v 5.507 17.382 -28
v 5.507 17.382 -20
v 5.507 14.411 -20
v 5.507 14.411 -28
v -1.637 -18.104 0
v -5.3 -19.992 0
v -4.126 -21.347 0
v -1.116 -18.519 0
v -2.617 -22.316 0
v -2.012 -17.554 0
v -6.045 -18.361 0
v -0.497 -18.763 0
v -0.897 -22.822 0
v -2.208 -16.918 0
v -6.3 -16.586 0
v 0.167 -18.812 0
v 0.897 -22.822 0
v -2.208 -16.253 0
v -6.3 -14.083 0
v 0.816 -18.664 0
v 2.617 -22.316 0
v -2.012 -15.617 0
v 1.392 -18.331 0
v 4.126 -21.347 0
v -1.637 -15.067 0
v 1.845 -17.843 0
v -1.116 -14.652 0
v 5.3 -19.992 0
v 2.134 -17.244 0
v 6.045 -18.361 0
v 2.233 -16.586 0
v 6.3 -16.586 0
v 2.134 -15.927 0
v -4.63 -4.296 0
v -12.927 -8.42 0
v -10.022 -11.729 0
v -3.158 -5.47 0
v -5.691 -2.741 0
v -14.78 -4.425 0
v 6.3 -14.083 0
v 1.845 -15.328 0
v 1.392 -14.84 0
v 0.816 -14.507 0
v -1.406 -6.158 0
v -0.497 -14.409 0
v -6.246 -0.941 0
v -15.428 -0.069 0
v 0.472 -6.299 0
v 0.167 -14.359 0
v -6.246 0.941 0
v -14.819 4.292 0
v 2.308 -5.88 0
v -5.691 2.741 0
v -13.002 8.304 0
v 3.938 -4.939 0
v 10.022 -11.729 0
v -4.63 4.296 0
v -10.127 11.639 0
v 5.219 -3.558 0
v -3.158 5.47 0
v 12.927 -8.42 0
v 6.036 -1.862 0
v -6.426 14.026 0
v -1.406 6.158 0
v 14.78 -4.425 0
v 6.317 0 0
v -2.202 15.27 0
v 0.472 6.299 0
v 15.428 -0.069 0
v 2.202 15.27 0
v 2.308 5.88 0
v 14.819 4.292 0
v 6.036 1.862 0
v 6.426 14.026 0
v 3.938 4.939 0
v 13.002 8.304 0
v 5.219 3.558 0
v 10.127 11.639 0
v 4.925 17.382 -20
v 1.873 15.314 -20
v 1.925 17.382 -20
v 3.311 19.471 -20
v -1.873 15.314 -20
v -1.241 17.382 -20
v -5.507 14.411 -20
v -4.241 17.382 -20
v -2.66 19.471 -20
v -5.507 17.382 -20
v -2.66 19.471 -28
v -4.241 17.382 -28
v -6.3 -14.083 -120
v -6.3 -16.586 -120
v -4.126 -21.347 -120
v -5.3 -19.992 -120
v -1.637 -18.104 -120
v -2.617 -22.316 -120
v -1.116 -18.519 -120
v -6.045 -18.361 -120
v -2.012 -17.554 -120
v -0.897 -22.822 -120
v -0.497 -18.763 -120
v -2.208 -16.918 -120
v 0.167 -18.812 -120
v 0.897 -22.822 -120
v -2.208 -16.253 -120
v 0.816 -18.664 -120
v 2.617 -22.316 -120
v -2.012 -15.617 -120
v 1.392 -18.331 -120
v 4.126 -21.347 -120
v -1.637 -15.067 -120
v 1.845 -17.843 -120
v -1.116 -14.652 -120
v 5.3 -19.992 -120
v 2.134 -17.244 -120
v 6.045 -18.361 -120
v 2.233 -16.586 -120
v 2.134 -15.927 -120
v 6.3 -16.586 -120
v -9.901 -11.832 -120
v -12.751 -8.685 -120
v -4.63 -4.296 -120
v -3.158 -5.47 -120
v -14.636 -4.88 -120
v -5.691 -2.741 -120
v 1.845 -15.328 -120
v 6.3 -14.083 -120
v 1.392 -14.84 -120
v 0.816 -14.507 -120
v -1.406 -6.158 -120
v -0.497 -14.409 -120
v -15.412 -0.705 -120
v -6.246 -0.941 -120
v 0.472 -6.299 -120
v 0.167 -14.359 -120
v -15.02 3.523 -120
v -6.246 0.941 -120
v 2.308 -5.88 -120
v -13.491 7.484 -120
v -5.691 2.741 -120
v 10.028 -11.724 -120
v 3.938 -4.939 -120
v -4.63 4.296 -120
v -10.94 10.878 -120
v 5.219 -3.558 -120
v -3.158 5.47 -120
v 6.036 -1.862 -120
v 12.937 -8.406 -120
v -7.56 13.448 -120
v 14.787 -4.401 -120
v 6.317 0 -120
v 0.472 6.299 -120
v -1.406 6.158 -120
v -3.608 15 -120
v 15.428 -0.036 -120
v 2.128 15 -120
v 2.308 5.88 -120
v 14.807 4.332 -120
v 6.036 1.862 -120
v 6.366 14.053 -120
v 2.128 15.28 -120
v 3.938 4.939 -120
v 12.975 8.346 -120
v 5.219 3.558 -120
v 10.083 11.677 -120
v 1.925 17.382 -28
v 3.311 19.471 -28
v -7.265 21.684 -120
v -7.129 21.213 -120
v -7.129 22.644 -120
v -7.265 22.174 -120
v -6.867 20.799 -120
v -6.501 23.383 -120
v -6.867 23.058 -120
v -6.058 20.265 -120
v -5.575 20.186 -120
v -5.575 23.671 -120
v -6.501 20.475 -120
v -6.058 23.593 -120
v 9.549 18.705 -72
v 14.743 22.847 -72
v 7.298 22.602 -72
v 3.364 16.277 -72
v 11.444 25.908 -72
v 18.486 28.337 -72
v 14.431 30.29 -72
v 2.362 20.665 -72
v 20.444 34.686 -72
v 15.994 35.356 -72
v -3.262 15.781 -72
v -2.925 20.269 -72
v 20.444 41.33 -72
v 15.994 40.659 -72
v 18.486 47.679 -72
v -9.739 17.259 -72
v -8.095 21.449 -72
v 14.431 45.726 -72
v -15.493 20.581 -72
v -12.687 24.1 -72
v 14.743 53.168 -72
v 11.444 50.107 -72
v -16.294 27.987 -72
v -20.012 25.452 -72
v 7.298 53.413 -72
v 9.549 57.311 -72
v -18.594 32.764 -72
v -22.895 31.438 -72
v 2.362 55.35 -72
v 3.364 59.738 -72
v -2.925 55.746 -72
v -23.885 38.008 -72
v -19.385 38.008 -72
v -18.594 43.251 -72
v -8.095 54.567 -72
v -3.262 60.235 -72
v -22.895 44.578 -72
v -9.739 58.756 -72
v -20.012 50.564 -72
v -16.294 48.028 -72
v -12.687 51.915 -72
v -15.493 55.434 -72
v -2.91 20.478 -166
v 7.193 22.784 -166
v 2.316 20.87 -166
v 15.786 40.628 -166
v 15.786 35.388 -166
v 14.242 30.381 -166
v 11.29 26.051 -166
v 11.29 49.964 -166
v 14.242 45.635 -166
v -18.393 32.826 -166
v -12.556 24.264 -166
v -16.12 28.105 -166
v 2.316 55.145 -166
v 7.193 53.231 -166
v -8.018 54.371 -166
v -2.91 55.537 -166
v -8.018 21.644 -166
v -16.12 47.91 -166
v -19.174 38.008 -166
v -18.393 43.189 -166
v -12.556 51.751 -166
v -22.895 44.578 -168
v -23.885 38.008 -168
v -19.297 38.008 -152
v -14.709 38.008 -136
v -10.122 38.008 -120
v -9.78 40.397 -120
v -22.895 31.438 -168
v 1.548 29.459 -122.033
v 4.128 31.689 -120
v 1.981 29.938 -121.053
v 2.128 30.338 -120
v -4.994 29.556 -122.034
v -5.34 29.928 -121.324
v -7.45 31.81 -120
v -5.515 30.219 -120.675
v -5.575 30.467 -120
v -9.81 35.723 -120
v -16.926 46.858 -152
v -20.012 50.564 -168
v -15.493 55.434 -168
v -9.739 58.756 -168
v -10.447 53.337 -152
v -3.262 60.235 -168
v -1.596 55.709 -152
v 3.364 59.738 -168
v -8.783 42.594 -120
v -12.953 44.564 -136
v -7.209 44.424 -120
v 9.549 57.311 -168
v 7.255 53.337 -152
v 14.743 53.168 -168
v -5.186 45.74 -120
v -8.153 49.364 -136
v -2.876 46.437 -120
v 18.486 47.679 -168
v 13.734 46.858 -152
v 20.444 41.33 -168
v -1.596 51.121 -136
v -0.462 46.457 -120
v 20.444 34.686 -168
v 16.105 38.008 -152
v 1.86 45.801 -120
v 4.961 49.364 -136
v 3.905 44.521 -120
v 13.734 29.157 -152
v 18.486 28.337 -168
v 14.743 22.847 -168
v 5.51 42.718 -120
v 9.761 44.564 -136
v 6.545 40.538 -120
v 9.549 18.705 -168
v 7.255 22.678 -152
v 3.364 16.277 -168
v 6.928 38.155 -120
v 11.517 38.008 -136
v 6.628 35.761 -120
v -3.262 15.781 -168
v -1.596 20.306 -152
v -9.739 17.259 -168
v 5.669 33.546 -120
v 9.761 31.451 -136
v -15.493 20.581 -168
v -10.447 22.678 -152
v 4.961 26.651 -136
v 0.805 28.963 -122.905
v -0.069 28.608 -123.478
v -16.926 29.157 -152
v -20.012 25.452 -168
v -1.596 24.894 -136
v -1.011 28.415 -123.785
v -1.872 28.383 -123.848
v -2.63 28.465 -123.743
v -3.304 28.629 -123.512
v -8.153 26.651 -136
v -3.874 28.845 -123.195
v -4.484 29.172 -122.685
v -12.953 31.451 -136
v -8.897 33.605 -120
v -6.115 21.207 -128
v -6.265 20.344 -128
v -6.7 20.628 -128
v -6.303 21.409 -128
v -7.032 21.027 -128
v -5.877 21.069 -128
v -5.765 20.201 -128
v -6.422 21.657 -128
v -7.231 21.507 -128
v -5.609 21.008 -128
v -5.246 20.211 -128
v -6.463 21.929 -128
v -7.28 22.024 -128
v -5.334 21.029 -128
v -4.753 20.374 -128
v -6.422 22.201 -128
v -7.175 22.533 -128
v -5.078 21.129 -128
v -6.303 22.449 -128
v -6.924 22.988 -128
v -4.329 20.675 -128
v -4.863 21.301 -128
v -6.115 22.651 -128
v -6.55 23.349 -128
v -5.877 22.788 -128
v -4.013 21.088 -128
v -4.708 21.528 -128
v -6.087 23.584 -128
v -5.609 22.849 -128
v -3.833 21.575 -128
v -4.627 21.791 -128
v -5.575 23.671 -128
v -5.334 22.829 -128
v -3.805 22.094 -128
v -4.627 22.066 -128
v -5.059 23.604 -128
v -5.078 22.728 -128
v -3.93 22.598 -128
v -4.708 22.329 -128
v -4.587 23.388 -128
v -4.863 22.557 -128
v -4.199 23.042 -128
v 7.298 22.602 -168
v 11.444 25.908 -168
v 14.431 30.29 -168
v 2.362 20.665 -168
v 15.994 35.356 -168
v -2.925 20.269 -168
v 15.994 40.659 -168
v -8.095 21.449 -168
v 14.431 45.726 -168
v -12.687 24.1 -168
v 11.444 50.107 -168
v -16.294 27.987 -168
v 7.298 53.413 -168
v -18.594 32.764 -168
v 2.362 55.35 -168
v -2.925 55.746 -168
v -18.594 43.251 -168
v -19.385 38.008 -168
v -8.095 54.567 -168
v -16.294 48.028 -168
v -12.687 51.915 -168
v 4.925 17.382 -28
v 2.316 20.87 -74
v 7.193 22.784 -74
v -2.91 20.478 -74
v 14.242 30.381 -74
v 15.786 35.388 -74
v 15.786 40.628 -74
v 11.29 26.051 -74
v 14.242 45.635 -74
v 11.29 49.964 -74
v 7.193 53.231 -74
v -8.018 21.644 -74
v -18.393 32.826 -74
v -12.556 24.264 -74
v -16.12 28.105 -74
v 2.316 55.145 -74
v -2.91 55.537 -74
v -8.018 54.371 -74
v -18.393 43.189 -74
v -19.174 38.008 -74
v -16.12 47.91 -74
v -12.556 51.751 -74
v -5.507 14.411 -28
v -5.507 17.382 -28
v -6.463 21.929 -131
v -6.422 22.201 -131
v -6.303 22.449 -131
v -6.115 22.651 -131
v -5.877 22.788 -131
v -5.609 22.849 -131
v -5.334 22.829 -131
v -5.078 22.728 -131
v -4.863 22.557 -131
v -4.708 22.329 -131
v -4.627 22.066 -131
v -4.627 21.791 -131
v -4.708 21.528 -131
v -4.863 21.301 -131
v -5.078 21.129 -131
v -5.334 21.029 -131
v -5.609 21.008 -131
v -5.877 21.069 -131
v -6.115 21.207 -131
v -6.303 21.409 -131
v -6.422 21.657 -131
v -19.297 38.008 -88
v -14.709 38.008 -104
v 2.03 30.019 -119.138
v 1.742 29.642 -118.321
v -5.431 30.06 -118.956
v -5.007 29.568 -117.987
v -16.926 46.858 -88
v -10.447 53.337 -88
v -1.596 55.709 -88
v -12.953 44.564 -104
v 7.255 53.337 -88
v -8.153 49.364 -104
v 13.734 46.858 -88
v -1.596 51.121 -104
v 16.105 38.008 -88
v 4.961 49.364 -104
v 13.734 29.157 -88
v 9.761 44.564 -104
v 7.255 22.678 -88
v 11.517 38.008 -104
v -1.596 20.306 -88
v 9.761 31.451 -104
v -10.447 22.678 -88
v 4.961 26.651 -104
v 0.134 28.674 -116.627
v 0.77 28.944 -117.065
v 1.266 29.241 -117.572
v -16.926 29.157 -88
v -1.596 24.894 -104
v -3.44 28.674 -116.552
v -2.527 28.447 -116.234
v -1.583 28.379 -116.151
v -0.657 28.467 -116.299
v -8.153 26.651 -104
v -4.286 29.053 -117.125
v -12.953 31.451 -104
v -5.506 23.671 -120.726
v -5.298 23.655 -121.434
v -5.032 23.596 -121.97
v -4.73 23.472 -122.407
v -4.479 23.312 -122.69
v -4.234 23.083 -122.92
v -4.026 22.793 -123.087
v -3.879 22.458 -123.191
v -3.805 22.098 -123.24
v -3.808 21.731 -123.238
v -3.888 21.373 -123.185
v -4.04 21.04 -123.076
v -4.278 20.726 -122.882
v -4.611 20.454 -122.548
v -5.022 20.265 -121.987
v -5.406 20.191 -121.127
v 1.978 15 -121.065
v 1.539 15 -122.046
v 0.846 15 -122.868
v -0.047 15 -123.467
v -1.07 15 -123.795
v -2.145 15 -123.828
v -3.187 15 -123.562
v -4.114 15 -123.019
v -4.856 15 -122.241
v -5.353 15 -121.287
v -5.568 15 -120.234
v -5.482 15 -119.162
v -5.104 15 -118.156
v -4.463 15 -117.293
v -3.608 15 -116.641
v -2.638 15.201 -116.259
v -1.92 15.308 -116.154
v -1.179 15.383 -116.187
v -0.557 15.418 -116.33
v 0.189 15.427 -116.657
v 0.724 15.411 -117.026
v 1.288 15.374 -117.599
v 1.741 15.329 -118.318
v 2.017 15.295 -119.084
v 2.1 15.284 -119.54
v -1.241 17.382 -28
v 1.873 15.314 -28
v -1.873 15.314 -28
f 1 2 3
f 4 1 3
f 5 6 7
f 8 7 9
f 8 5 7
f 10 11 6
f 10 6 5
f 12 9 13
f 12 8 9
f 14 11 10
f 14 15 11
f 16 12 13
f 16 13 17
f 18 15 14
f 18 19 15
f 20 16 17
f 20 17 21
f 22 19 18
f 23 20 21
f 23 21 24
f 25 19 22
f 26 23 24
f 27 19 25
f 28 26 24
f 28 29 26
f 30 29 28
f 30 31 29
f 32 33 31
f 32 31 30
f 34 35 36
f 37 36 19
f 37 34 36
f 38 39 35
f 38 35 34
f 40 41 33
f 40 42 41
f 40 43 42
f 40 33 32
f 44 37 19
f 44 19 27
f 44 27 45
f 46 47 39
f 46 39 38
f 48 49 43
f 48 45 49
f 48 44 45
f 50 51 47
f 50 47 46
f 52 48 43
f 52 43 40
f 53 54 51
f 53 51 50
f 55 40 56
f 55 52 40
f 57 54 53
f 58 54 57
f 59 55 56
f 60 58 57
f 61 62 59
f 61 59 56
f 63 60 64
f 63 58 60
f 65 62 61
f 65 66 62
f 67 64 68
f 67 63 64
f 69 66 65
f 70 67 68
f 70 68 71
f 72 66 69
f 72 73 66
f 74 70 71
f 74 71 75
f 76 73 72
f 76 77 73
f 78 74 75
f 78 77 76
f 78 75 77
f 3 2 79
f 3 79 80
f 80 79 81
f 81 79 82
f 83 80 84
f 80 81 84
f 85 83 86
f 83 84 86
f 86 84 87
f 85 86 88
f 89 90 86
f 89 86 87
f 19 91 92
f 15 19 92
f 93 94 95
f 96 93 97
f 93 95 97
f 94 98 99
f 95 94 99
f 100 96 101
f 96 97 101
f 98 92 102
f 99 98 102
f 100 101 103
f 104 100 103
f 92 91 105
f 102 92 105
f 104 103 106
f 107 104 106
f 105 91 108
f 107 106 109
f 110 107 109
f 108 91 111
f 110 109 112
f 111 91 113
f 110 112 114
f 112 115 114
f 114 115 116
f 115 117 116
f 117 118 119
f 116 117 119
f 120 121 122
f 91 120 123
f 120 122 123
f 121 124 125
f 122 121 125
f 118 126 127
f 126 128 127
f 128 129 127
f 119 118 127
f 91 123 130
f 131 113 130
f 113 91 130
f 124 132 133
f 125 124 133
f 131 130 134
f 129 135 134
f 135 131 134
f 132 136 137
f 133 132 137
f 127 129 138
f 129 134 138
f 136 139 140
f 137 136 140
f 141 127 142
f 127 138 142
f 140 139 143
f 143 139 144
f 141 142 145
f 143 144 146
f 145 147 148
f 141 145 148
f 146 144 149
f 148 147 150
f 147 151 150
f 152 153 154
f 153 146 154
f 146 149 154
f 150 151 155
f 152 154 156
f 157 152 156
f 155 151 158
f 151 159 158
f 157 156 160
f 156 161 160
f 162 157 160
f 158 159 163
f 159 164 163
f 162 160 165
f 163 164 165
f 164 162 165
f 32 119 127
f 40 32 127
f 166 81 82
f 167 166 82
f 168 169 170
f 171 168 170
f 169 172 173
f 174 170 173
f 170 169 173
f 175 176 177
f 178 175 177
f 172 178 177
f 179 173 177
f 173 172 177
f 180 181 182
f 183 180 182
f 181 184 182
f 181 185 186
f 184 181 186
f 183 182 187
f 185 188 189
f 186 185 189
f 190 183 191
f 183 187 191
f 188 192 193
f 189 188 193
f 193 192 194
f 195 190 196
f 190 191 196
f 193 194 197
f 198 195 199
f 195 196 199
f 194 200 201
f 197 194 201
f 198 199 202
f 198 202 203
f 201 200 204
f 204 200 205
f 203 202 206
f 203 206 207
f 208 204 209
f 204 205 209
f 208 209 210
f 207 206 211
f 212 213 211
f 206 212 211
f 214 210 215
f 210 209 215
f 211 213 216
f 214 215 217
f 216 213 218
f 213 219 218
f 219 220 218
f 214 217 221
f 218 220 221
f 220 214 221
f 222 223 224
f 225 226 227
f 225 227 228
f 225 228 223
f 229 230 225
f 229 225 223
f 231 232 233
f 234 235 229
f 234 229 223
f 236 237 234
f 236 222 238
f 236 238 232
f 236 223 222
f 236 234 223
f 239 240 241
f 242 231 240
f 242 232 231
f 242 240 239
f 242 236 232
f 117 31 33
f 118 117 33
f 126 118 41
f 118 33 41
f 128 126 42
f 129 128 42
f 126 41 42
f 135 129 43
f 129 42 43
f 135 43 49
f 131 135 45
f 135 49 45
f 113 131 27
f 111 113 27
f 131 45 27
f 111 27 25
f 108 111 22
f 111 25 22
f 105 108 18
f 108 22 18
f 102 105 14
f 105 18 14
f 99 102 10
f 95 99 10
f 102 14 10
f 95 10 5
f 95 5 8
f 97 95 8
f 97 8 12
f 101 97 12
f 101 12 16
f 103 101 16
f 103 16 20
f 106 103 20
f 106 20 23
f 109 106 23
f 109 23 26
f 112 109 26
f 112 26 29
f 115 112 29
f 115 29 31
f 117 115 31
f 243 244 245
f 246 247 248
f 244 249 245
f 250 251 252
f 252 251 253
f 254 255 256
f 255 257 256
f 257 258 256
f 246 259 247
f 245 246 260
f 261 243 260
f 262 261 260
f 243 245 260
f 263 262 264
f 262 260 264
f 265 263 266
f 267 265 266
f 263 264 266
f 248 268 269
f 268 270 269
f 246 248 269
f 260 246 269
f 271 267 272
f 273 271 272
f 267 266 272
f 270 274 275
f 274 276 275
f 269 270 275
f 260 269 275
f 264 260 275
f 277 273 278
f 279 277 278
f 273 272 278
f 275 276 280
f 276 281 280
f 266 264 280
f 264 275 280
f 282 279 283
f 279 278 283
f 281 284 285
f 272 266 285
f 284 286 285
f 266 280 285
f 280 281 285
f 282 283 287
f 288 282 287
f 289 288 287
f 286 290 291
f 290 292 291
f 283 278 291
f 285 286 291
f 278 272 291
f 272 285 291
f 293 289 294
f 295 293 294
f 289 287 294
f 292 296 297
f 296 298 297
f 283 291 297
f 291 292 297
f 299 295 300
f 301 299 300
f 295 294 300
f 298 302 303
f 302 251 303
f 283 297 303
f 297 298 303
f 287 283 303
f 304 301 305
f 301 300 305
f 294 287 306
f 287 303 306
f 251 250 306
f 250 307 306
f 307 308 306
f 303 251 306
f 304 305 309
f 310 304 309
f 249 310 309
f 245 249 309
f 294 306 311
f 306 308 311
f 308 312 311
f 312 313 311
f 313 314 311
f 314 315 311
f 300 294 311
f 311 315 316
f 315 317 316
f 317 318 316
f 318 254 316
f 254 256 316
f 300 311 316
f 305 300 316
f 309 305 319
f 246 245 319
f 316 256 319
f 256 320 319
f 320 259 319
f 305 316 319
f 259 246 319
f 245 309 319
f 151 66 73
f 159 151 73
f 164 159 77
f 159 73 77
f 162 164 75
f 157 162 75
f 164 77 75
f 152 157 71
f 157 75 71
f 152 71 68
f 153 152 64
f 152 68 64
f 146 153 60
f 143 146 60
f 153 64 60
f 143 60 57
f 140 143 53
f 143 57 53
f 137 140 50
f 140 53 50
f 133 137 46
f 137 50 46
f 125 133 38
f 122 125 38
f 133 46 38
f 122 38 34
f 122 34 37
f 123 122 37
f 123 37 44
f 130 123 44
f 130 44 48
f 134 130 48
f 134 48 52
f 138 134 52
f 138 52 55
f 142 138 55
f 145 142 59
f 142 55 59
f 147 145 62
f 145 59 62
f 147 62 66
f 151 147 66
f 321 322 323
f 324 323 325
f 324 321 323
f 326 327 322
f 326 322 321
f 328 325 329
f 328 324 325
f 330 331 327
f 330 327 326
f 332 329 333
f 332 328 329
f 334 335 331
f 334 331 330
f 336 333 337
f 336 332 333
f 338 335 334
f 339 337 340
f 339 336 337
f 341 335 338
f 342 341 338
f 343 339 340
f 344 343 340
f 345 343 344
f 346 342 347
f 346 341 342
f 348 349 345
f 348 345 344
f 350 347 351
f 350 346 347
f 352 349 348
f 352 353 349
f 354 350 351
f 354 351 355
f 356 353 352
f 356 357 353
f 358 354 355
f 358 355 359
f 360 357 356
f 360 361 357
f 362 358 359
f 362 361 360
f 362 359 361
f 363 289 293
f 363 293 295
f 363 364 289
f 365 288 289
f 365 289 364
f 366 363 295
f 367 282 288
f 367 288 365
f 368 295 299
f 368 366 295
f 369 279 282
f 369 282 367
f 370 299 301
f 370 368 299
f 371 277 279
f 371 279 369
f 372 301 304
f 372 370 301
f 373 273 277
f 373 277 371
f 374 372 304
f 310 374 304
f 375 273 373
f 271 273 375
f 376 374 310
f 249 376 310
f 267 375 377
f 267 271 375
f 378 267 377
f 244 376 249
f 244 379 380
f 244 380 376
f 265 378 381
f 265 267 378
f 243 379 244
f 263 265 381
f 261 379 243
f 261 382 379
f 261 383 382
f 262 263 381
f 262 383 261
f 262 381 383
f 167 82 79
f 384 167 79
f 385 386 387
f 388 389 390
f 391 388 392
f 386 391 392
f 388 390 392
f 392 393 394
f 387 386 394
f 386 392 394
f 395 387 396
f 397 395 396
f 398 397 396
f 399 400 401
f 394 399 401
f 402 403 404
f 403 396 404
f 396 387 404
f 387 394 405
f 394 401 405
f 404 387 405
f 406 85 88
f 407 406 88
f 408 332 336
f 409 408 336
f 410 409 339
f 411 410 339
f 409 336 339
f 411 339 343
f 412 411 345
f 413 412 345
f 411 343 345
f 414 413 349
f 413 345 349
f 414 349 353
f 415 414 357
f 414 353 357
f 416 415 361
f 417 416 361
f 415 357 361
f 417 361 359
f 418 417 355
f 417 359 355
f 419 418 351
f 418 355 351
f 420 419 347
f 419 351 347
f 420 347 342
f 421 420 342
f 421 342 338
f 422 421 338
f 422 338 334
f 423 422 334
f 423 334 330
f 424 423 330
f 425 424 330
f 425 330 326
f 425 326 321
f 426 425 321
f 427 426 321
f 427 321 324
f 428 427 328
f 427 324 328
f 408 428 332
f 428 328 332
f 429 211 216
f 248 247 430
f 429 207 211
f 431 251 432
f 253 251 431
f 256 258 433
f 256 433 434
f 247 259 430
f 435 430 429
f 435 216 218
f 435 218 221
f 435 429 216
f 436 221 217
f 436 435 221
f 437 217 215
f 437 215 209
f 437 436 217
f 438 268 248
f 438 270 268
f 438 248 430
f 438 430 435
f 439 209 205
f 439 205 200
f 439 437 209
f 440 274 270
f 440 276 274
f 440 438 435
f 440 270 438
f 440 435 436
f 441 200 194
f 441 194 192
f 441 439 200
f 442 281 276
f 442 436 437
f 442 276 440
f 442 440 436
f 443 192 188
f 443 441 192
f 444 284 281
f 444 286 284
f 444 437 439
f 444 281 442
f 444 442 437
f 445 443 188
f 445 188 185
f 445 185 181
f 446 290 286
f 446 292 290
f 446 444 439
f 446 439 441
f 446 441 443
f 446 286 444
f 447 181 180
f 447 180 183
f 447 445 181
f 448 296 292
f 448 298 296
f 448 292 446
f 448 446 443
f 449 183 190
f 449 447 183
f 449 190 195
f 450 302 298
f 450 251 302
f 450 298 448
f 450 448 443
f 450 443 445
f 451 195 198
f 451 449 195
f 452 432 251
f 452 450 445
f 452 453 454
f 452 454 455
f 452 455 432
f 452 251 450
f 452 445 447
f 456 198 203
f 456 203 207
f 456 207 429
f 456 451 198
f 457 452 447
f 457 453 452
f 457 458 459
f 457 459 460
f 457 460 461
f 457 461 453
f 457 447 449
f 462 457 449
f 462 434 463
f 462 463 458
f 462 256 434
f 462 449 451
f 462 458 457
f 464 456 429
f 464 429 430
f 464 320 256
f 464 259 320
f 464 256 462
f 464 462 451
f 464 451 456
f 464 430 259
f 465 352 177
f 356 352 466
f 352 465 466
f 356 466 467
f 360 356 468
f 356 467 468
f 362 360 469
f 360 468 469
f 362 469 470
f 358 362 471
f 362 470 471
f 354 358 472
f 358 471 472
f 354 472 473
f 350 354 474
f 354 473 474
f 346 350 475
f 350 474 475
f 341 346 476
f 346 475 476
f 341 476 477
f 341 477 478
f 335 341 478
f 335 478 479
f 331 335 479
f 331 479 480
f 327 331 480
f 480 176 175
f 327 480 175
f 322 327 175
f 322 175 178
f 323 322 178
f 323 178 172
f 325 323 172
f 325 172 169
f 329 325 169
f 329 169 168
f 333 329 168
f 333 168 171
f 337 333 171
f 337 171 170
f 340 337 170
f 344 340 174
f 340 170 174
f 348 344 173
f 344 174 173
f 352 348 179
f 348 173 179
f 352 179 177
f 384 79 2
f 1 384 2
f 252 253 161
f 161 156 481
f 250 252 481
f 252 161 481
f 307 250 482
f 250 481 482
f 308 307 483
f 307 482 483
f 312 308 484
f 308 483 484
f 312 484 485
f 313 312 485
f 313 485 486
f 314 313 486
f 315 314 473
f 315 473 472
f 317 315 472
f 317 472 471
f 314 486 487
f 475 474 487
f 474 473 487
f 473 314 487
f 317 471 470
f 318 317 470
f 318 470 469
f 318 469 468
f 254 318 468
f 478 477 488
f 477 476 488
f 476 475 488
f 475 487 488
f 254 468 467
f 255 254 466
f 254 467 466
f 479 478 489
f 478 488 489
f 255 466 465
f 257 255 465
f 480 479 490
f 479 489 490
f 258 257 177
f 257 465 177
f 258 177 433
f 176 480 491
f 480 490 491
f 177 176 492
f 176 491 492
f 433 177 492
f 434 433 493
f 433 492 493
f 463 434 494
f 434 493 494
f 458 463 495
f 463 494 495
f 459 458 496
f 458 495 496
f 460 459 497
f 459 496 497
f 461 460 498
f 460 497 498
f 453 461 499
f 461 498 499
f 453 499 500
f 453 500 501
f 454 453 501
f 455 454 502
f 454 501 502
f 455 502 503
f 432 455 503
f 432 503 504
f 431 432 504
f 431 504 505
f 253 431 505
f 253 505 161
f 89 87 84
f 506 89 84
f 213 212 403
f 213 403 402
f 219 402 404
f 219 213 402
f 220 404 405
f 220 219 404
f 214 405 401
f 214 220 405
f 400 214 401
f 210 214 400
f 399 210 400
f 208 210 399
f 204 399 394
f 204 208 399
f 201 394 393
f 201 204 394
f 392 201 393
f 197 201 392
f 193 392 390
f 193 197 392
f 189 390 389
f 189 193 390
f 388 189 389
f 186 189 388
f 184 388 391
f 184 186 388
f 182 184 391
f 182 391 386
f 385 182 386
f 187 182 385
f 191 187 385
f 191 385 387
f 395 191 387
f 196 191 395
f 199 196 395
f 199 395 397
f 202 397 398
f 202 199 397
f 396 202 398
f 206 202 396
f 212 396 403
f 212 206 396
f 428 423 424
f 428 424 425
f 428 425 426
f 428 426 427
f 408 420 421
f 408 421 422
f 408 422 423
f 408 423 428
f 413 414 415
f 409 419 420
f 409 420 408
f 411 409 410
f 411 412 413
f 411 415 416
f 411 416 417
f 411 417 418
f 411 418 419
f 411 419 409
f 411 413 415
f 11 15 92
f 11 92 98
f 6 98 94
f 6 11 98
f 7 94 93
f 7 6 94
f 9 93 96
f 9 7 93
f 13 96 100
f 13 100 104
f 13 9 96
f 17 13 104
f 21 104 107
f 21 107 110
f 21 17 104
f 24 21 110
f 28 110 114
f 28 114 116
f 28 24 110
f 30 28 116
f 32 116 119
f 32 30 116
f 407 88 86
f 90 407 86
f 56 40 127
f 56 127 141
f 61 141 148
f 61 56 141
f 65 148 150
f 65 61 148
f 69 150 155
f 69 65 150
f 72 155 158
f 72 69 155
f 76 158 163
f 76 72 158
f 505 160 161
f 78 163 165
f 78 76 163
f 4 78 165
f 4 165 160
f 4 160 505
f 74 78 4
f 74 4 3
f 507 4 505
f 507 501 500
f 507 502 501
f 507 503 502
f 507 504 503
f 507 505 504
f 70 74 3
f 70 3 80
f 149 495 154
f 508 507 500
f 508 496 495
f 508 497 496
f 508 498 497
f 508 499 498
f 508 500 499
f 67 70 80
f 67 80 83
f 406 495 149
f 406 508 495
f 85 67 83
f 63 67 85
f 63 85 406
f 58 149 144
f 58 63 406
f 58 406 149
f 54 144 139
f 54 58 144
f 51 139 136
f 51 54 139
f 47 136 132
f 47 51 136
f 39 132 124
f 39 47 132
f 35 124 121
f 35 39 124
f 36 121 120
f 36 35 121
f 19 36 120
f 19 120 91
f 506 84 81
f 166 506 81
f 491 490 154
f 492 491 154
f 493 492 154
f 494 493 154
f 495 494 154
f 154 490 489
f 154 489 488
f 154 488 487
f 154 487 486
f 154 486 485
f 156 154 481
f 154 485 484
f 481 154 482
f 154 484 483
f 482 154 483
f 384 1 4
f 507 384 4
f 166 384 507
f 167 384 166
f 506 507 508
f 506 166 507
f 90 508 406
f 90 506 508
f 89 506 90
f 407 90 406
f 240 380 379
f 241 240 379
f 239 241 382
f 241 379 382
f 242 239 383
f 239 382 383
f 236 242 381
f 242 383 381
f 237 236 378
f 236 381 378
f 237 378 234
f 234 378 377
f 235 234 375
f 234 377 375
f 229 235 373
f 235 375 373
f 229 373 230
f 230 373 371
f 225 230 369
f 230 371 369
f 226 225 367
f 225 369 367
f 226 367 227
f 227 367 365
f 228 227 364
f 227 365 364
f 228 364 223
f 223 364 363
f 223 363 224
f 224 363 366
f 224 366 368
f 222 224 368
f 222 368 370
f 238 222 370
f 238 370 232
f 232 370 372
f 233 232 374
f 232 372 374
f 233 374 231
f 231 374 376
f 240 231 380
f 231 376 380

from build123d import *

# Parameters (mm, degrees)
SKETCH1_R           = 15.427757536
SKETCH1_R_2         = 6.316623128
BOSS_EXTRUDE1_DEPTH = 120
SKETCH2_R           = 2.232947937
CUT_EXTRUDE1_DEPTH  = 124.133145307
BOSS_EXTRUDE2_DEPTH = 8
SKETCH4_R           = 8.525514215
BOSS_EXTRUDE3_DEPTH = 48
BOSS_EXTRUDE3_DRAFT = -16
SKETCH6_R           = 17.788526435
CUT_EXTRUDE2_DEPTH  = 2
CUT_EXTRUDE2_DRAFT  = -6
SKETCH9_R           = 3.851191152
BOSS_EXTRUDE4_DEPTH = 17
SKETCH10_R          = 1.742885096
BOSS_EXTRUDE5_DEPTH = 8
SKETCH11_R          = 0.9231432
BOSS_EXTRUDE6_DEPTH = 3


with BuildPart() as part:
    # Sketch1 → Boss-Extrude1 (new body)
    # profile 1 of 2: a face of its own
    with BuildSketch(Plane.XY):
        with BuildLine():
            ThreePointArc((6.300172561, -14.082738665), (0, -15.427757536), (-6.300172561, -14.082738665))
            Line((-6.300172561, -14.082738665), (-6.300172561, -16.585538494))
            ThreePointArc((-6.300172561, -16.585538494), (0, -22.885711055), (6.300172561, -16.585538494))
            Line((6.300172561, -16.585538494), (6.300172561, -14.082738665))
        make_face()
    # profile 2 of 2: a face of its own
    with BuildSketch(Plane.XY):
        Circle(SKETCH1_R)
        Circle(SKETCH1_R_2, mode=Mode.SUBTRACT)
    extrude(amount=-BOSS_EXTRUDE1_DEPTH)

    # Sketch2 → Cut-Extrude1 (cut, through all)
    with BuildSketch(Plane.XY):
        with Locations((0, -16.585538494)):
            Circle(SKETCH2_R)
    extrude(amount=-CUT_EXTRUDE1_DEPTH, mode=Mode.SUBTRACT)

    # Sketch3 → Boss-Extrude2 (add)
    with BuildSketch(Plane.XY.offset(-20)):
        Polygon((-5.507367926, 14.411266465), (-5.507367926, 17.381711903), (-4.2414169, 17.381711903), (-2.659812694, 19.470864473), (-1.2414169, 17.381711903), (1.925005593, 17.381711903), (3.311155437, 19.470864473), (4.925005593, 17.381711903), (5.507367926, 17.381711903), (5.507367926, 14.411266465), align=None)
    extrude(amount=-BOSS_EXTRUDE2_DEPTH)



with BuildPart() as body_2:
    # Sketch4 → Boss-Extrude3 (with draft: the straight prism first)
    with BuildSketch(Plane(origin=(0, 0, -120), x_dir=(-1, 0, 0), z_dir=(0, 0, -1))):
        with Locations((1.595997464, 38.007665121)):
            Circle(SKETCH4_R)
    extrude(amount=BOSS_EXTRUDE3_DEPTH)
    # Boss-Extrude3: the draft: its side faces are tilted about the plane it starts from
    boss_extrude3_sides = [body_2.faces().sort_by_distance(p)[0] for p in [
        (6.929516751, 38.007665121, -144),
    ]]
    draft(boss_extrude3_sides, Plane(origin=(0, 0, -120), x_dir=(-1, 0, 0), z_dir=(0, 0, -1)), BOSS_EXTRUDE3_DRAFT)


with BuildPart() as cut_extrude2_tool:
    # Sketch6 → Cut-Extrude2 (with draft: the straight prism first)
    with BuildSketch(Plane(origin=(0, 0, -168), x_dir=(-1, 0, 0), z_dir=(0, 0, -1))):
        with Locations((1.595997464, 38.007665121)):
            Circle(SKETCH6_R)
    extrude(amount=-CUT_EXTRUDE2_DEPTH)
    # Cut-Extrude2: the draft: its side faces are tilted about the plane it starts from
    cut_extrude2_sides = [cut_extrude2_tool.faces().sort_by_distance(p)[0] for p in [
        (16.192528971, 38.007665121, -167),
    ]]
    draft(cut_extrude2_sides, Plane(origin=(0, 0, -168), x_dir=(-1, 0, 0), z_dir=(0, 0, -1)), CUT_EXTRUDE2_DRAFT)


with BuildPart() as body_2_1:
    add(body_2.part)

    # Cut-Extrude2: cut by cut_extrude2_tool
    add(cut_extrude2_tool.part, mode=Mode.SUBTRACT)


with BuildPart() as body_3:
    # Mirror2: mirrored copy
    add(body_2_1.part.mirror(Plane(origin=(-1.595997464, 38.007665121, -120), x_dir=(1, 0, 0), z_dir=(0, 0, -1))))


with BuildPart() as part_1:
    add(part.part)

    add(body_2_1.part)  # Boss-Extrude4 merges body 2

    add(body_3.part)  # Boss-Extrude4 merges body 3
    # Sketch9 → Boss-Extrude4 (add)
    with BuildSketch(Plane(origin=(0, 15, 0), x_dir=(1, 0, 0), z_dir=(0, 1, 0))):
        with Locations((-1.723427255, 120)):
            Circle(SKETCH9_R)
    extrude(amount=BOSS_EXTRUDE4_DEPTH)

    # Sketch10 → Boss-Extrude5 (add)
    with BuildSketch(Plane(origin=(0, 0, -120), x_dir=(-1, 0, 0), z_dir=(0, 0, -1))):
        with Locations(Location((5.539882161, 21.928787469, 0), (0, 0, 88.858001541))):
            Circle(SKETCH10_R)
    extrude(amount=BOSS_EXTRUDE5_DEPTH)

    # Sketch11 → Boss-Extrude6 (add)
    with BuildSketch(Plane(origin=(0, 0, -128), x_dir=(-1, 0, 0), z_dir=(0, 0, -1))):
        with Locations((5.539882161, 21.928787469)):
            Circle(SKETCH11_R)
    extrude(amount=BOSS_EXTRUDE6_DEPTH)


solid = part_1.part
